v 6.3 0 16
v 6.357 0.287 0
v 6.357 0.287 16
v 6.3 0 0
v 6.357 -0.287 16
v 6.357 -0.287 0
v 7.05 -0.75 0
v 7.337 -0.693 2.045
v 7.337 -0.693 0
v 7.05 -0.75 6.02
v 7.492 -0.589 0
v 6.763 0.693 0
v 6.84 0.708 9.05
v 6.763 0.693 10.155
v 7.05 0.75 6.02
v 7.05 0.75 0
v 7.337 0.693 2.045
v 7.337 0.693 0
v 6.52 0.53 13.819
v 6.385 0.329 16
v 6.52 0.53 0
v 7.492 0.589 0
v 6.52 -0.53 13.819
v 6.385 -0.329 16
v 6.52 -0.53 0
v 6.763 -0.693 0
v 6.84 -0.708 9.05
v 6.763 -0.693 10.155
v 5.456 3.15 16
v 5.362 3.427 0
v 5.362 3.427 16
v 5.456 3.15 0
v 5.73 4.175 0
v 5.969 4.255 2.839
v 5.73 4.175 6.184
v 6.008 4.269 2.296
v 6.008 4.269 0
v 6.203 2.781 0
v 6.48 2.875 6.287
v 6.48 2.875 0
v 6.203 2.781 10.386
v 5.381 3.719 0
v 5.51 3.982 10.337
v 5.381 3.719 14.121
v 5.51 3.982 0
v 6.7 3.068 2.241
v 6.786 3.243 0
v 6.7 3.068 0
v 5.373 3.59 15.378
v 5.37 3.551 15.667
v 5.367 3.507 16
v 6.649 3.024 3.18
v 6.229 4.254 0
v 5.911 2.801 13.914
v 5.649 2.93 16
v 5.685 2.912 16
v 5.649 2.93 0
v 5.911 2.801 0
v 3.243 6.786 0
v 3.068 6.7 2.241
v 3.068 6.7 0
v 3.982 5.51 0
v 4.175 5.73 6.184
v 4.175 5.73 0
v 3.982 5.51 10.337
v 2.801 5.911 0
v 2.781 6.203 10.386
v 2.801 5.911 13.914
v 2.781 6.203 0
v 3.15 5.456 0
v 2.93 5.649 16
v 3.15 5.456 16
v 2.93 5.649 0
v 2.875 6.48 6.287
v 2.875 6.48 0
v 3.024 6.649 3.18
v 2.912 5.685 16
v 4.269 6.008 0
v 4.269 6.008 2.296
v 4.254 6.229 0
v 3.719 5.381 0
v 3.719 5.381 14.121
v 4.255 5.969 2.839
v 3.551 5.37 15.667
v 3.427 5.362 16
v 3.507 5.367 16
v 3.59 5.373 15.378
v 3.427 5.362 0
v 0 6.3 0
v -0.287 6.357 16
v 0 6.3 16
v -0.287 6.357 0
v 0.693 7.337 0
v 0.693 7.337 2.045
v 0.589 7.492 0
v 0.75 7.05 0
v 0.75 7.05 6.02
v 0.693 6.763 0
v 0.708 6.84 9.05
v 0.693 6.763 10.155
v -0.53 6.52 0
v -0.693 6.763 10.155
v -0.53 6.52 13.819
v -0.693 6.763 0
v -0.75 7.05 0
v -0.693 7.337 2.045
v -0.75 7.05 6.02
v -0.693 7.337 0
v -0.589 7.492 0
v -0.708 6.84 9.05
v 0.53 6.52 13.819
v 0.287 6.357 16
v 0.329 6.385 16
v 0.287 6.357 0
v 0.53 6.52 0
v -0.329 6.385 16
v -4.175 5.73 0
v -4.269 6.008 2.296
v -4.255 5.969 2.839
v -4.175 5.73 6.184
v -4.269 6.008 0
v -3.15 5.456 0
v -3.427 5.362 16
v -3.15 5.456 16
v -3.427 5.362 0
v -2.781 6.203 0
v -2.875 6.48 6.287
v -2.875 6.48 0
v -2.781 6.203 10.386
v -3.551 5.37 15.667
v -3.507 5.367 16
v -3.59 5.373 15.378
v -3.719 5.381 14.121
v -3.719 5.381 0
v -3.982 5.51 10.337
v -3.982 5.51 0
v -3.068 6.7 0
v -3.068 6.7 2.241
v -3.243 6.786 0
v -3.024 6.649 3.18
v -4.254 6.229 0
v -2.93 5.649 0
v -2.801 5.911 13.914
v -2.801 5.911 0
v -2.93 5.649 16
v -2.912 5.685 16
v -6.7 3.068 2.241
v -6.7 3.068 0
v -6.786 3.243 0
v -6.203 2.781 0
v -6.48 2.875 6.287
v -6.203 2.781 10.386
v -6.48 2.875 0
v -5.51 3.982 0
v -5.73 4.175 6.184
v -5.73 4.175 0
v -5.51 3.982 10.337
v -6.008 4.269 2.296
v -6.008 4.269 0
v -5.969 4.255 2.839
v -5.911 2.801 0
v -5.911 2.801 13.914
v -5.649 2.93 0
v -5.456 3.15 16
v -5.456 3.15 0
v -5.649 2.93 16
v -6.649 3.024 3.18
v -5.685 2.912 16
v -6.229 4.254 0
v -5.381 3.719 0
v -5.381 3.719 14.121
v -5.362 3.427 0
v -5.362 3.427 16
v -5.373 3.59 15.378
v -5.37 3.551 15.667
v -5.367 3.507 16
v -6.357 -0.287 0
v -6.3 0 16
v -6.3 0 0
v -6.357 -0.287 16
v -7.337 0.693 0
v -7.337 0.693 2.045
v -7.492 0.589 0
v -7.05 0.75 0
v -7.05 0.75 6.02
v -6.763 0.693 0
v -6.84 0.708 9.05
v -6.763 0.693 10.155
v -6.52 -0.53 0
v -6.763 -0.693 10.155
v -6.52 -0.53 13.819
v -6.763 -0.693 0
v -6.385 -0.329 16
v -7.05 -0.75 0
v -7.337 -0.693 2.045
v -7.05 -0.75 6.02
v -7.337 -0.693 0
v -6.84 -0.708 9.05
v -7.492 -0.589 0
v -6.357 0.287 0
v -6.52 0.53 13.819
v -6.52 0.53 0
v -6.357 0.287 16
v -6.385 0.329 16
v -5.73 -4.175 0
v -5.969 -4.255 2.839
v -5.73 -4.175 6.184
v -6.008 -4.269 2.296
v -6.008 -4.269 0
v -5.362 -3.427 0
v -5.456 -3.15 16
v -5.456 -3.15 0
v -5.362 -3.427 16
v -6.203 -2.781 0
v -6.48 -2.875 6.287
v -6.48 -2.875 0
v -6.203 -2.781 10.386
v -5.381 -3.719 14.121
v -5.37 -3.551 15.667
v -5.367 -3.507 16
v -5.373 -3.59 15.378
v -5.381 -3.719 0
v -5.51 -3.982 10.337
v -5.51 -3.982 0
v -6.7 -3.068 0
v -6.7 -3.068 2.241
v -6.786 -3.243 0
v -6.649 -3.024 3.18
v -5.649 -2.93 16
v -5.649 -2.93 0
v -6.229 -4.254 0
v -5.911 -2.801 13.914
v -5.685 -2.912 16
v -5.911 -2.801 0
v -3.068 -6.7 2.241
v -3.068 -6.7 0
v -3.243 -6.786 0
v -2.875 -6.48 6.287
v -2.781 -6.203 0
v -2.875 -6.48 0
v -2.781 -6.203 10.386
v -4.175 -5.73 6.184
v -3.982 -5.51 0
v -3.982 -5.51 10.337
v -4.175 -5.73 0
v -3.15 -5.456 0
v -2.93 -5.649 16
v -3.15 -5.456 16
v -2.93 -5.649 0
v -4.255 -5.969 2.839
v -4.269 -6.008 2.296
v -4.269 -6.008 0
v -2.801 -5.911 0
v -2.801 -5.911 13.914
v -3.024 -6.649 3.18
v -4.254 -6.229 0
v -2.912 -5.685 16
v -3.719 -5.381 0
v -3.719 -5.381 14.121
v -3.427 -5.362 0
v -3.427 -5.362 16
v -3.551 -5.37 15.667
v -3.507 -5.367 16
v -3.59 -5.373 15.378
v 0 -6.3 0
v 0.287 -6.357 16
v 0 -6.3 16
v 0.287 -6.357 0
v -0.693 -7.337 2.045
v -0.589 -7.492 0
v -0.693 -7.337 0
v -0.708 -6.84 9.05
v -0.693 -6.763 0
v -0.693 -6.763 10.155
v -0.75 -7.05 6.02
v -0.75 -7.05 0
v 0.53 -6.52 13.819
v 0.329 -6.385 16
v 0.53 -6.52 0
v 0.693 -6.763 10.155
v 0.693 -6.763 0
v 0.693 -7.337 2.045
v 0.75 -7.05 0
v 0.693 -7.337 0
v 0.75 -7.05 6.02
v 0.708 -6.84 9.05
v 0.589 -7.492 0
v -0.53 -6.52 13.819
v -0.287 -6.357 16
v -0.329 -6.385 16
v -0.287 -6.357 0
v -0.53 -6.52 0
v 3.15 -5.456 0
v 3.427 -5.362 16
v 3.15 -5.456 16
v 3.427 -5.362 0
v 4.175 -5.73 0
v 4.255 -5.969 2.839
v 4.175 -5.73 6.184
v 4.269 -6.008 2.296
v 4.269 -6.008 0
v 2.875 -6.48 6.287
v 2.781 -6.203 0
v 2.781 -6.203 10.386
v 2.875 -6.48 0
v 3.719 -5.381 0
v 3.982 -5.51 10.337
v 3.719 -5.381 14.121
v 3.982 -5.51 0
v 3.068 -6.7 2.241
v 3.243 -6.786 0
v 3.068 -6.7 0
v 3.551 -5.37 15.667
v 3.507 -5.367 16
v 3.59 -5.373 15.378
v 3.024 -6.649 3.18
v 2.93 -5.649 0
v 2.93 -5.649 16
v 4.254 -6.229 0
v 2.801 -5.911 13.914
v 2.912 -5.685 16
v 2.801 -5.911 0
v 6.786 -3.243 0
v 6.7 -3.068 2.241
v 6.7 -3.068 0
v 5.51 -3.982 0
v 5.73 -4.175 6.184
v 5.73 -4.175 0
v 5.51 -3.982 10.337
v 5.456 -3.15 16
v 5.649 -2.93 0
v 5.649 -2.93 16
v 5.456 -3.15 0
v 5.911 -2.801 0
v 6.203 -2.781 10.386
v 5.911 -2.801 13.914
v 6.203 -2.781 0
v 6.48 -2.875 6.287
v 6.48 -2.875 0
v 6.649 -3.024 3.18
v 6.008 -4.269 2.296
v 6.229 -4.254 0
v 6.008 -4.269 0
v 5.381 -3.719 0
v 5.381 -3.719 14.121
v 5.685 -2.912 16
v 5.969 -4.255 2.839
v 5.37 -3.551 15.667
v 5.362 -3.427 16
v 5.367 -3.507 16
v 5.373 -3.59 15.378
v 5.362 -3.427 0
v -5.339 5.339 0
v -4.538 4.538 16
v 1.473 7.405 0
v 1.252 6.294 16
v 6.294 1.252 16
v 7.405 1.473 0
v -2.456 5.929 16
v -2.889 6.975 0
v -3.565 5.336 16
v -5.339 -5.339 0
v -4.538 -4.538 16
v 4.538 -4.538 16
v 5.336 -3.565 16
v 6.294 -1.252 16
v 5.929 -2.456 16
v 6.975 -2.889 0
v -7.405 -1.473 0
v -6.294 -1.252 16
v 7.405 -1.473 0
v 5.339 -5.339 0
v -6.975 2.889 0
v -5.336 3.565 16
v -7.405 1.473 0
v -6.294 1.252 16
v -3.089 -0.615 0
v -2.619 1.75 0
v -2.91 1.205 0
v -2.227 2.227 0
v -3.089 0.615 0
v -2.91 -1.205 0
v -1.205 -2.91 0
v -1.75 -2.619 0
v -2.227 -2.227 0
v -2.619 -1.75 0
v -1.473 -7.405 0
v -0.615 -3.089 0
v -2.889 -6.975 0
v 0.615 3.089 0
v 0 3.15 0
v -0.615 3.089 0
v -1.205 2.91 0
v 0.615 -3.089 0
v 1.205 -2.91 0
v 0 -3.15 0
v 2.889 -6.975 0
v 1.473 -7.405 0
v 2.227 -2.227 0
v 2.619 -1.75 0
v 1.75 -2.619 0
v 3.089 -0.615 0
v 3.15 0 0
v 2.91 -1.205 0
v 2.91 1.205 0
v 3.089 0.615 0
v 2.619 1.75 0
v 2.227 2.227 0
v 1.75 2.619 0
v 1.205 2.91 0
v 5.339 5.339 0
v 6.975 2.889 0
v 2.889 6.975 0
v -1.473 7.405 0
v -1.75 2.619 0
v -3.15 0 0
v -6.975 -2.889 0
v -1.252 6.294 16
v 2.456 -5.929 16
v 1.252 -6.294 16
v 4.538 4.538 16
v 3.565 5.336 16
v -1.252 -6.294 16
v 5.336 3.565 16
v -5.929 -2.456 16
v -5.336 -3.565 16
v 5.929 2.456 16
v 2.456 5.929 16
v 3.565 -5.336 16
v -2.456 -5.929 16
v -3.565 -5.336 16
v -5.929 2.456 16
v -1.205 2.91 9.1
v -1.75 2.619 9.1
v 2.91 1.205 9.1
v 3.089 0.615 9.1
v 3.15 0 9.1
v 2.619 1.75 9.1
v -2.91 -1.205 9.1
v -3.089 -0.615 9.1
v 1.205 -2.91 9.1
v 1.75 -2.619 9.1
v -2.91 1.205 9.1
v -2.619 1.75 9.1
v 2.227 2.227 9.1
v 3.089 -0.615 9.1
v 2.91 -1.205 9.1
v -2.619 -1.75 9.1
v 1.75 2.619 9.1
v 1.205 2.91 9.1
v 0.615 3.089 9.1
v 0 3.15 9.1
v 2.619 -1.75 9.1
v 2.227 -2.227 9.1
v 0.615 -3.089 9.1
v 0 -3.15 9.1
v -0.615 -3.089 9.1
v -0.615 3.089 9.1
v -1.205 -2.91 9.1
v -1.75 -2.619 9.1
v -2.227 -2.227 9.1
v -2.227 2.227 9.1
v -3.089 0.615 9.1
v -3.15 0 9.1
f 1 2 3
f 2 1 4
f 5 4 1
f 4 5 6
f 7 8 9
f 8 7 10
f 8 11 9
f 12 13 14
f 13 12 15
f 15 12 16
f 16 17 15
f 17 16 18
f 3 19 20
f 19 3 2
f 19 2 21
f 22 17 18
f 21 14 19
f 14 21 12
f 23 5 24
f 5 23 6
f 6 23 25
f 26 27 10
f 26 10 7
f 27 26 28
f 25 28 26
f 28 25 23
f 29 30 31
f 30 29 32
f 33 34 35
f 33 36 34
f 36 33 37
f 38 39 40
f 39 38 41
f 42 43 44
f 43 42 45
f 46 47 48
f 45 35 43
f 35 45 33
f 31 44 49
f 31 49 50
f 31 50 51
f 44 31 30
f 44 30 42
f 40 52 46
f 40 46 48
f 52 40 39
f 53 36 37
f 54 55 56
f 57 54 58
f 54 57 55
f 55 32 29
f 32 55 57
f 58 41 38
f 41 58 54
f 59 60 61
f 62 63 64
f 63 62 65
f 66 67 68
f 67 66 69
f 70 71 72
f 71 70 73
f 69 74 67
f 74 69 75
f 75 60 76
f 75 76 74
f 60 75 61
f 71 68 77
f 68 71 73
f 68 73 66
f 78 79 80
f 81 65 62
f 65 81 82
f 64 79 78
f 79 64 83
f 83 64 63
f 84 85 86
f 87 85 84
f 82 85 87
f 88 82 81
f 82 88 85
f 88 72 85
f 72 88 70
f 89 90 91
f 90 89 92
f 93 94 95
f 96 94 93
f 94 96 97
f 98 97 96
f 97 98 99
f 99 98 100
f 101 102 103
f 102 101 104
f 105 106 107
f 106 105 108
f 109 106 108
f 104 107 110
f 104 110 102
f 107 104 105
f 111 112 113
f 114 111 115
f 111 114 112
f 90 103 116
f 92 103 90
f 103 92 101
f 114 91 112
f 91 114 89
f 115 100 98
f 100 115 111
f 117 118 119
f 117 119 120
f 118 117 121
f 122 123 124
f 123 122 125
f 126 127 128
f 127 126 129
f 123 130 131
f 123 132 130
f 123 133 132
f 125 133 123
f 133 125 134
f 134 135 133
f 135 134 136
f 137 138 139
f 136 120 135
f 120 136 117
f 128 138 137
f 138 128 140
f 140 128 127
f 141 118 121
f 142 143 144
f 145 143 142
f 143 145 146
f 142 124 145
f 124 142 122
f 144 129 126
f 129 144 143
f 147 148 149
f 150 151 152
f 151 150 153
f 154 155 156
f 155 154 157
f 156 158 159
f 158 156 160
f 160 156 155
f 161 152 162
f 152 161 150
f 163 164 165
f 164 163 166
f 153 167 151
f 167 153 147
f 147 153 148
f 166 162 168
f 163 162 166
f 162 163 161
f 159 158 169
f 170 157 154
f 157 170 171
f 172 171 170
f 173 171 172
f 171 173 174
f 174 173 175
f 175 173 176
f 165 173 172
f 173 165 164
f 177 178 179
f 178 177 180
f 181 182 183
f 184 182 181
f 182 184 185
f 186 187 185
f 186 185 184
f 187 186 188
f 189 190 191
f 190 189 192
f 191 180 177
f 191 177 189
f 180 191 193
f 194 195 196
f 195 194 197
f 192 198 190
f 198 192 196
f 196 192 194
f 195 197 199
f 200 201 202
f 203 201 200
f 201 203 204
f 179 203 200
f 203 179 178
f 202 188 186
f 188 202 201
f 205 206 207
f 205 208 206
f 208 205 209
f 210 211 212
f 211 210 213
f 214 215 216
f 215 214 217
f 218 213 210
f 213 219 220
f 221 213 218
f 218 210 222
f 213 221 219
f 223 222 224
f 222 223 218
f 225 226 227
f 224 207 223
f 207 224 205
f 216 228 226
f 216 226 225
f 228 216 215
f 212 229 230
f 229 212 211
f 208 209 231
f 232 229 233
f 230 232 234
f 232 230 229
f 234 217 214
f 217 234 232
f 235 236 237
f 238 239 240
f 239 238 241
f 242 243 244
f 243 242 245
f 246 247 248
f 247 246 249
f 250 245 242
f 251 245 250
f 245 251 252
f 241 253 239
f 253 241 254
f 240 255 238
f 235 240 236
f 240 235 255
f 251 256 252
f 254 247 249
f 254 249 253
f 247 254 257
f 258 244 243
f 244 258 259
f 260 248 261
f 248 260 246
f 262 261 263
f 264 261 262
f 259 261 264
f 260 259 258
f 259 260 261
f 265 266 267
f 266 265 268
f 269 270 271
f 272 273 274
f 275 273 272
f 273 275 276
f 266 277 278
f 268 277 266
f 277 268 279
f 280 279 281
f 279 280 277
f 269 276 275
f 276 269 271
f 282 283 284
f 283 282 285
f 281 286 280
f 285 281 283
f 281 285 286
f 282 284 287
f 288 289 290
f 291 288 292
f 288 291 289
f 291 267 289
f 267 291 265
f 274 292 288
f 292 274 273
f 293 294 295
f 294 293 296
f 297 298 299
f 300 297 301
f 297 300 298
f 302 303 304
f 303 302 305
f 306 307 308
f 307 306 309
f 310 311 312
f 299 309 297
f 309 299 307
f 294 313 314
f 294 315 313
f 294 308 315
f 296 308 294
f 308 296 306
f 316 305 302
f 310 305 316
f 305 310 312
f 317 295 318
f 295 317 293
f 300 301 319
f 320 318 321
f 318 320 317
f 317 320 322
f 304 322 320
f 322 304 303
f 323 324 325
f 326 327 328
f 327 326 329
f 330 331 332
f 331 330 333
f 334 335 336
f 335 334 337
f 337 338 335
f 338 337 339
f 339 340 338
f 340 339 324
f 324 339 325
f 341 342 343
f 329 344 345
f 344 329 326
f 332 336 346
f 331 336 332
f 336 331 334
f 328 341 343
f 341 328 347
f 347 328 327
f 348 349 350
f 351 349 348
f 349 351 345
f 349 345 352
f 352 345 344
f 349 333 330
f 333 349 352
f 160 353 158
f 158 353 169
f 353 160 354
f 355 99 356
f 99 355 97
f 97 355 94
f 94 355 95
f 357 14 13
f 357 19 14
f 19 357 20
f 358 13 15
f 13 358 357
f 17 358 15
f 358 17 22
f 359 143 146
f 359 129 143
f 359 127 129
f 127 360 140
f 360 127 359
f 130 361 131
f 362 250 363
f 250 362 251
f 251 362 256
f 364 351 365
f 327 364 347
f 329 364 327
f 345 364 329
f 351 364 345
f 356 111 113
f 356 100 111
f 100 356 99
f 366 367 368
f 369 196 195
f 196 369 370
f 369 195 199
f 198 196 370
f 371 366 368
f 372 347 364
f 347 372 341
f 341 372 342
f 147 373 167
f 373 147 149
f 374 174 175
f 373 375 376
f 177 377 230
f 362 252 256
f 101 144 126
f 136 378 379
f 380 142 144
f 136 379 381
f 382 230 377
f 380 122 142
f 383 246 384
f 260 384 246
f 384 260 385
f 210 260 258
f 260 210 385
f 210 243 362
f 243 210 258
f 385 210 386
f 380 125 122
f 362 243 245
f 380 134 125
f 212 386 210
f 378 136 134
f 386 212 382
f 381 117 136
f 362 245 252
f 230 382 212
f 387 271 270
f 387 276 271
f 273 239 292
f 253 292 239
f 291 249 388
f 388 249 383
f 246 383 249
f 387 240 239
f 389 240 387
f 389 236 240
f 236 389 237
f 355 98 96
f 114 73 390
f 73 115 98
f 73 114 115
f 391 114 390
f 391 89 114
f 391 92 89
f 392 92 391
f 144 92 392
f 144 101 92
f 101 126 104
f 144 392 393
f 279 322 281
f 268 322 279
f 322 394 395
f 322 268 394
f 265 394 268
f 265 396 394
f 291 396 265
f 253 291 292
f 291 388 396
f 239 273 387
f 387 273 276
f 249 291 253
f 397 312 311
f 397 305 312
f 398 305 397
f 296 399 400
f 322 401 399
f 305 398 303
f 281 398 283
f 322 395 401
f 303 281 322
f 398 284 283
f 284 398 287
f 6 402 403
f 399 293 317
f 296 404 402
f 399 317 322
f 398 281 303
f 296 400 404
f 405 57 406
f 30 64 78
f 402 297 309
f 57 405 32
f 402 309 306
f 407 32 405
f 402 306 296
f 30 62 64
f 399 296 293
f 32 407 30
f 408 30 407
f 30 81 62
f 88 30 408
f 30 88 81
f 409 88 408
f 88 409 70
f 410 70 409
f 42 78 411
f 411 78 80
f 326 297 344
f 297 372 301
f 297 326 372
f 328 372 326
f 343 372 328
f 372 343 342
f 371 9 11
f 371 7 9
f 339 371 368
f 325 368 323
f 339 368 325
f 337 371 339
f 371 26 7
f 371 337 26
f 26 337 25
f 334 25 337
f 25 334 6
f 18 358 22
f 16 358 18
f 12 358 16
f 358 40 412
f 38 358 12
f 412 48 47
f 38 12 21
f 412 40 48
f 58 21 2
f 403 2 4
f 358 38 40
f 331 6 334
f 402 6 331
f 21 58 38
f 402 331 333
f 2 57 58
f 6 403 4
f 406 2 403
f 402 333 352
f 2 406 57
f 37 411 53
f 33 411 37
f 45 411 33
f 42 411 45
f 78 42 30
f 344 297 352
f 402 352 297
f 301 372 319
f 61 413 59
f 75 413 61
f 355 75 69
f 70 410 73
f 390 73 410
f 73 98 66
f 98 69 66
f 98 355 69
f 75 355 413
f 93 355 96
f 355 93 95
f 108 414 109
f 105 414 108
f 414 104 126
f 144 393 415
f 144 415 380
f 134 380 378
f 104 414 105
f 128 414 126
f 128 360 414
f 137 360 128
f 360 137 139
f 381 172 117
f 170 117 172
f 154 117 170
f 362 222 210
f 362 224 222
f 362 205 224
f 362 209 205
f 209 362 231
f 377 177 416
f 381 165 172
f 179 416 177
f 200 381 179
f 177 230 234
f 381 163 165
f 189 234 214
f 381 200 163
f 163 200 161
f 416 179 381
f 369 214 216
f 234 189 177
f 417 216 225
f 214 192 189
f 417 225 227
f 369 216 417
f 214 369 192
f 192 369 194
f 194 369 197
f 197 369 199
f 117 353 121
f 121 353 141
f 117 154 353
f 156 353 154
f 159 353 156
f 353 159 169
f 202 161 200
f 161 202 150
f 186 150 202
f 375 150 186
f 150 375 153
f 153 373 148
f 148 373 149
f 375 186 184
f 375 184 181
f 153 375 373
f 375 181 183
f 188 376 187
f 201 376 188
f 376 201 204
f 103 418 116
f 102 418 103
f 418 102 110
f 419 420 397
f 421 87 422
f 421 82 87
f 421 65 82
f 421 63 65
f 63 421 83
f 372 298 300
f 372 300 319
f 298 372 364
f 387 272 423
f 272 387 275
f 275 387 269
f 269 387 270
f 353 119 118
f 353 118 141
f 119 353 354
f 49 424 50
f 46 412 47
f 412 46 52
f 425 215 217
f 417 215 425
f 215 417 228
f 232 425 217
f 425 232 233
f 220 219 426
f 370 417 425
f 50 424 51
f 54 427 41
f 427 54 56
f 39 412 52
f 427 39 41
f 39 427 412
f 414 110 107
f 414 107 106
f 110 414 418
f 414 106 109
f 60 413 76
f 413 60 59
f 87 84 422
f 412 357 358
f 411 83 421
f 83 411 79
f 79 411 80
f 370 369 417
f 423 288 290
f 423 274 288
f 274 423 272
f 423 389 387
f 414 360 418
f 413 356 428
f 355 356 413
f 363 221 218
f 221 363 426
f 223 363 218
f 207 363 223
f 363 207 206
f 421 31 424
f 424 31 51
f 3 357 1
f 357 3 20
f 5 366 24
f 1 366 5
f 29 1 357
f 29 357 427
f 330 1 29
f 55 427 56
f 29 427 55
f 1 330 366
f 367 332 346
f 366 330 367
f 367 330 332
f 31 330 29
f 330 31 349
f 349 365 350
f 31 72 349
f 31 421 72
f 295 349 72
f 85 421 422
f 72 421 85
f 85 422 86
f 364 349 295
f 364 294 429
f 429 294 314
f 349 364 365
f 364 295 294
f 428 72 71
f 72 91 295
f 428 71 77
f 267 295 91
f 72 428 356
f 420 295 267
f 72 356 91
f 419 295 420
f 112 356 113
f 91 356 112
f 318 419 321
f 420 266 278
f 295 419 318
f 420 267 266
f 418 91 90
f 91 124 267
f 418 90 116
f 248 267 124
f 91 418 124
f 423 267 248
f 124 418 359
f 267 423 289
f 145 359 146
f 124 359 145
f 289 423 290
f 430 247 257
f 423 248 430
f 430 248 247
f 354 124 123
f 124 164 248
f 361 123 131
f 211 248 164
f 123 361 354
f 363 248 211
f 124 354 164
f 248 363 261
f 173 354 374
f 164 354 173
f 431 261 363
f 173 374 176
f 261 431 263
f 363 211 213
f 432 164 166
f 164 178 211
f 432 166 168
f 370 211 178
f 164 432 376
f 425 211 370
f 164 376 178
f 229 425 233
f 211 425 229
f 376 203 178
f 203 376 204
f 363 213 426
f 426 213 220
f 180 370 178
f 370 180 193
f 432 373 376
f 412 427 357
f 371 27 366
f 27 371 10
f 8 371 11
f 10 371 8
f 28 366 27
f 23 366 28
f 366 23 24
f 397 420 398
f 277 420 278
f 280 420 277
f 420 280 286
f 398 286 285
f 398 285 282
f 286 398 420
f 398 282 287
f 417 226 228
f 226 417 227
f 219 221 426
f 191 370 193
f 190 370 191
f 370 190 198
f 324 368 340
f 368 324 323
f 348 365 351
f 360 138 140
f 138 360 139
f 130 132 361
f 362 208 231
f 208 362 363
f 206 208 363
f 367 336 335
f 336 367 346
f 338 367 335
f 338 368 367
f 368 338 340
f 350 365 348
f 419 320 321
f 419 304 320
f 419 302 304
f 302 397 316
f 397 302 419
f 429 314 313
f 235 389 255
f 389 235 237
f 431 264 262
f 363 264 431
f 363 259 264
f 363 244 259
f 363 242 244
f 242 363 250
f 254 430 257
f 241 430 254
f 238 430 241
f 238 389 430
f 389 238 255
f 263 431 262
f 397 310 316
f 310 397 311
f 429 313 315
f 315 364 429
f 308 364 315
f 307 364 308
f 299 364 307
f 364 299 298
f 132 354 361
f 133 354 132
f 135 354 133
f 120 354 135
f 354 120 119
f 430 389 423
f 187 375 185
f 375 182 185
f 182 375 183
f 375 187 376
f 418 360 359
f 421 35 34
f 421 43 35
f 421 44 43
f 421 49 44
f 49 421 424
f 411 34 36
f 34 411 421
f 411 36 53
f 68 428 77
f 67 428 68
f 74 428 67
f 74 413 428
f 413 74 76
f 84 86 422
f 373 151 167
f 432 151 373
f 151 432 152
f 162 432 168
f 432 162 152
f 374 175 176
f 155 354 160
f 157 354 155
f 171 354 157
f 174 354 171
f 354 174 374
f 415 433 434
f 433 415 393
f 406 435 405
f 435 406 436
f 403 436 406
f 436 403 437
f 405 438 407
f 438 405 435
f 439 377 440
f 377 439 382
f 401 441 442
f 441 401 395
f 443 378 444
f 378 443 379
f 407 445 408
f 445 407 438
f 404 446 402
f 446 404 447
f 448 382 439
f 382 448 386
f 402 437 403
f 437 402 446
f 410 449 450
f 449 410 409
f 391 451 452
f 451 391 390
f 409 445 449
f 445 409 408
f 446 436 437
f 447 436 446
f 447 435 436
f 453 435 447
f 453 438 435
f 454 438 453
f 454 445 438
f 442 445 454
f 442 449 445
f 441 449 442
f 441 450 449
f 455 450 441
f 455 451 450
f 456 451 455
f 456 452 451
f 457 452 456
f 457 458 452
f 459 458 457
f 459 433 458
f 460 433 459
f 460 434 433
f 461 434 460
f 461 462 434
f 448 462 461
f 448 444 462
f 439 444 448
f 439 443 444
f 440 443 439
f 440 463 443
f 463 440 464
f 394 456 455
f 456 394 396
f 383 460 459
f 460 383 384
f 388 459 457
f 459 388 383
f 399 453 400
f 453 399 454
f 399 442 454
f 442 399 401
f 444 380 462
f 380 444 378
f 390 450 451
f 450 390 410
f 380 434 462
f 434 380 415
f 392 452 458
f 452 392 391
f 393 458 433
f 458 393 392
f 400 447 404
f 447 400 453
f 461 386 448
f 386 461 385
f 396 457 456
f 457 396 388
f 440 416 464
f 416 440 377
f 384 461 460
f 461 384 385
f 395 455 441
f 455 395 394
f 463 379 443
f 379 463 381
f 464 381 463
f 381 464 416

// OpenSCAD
// ACCESS KNOB — ARP / Modular Synth Slider Knob
// Generated via CLI for Studio Knobs
module access_knob_arp_slider_knob() {
  outer_d = 15.1;
  height = 16;
  taper = 0.85;
  bore_d = 6;
  slot_h = 9;
  tex_depth = 1;
  tex_scale = 1.5;
  tex_count = 12;

  difference() {
    cylinder(h=height, d1=outer_d, d2=outer_d*taper, $fn=32);
    translate([0,0,-0.1]) cylinder(h=slot_h+0.2, d=bore_d + 0.3, $fn=32);
    for(i=[0:tex_count-1]) {
      rotate([0,0,i*(360/tex_count)])
        translate([outer_d/2-tex_depth/2, 0, height/2])
          cylinder(h=height*1.1, d=tex_scale, center=true, $fn=16);
    }
  }
}
access_knob_arp_slider_knob();
